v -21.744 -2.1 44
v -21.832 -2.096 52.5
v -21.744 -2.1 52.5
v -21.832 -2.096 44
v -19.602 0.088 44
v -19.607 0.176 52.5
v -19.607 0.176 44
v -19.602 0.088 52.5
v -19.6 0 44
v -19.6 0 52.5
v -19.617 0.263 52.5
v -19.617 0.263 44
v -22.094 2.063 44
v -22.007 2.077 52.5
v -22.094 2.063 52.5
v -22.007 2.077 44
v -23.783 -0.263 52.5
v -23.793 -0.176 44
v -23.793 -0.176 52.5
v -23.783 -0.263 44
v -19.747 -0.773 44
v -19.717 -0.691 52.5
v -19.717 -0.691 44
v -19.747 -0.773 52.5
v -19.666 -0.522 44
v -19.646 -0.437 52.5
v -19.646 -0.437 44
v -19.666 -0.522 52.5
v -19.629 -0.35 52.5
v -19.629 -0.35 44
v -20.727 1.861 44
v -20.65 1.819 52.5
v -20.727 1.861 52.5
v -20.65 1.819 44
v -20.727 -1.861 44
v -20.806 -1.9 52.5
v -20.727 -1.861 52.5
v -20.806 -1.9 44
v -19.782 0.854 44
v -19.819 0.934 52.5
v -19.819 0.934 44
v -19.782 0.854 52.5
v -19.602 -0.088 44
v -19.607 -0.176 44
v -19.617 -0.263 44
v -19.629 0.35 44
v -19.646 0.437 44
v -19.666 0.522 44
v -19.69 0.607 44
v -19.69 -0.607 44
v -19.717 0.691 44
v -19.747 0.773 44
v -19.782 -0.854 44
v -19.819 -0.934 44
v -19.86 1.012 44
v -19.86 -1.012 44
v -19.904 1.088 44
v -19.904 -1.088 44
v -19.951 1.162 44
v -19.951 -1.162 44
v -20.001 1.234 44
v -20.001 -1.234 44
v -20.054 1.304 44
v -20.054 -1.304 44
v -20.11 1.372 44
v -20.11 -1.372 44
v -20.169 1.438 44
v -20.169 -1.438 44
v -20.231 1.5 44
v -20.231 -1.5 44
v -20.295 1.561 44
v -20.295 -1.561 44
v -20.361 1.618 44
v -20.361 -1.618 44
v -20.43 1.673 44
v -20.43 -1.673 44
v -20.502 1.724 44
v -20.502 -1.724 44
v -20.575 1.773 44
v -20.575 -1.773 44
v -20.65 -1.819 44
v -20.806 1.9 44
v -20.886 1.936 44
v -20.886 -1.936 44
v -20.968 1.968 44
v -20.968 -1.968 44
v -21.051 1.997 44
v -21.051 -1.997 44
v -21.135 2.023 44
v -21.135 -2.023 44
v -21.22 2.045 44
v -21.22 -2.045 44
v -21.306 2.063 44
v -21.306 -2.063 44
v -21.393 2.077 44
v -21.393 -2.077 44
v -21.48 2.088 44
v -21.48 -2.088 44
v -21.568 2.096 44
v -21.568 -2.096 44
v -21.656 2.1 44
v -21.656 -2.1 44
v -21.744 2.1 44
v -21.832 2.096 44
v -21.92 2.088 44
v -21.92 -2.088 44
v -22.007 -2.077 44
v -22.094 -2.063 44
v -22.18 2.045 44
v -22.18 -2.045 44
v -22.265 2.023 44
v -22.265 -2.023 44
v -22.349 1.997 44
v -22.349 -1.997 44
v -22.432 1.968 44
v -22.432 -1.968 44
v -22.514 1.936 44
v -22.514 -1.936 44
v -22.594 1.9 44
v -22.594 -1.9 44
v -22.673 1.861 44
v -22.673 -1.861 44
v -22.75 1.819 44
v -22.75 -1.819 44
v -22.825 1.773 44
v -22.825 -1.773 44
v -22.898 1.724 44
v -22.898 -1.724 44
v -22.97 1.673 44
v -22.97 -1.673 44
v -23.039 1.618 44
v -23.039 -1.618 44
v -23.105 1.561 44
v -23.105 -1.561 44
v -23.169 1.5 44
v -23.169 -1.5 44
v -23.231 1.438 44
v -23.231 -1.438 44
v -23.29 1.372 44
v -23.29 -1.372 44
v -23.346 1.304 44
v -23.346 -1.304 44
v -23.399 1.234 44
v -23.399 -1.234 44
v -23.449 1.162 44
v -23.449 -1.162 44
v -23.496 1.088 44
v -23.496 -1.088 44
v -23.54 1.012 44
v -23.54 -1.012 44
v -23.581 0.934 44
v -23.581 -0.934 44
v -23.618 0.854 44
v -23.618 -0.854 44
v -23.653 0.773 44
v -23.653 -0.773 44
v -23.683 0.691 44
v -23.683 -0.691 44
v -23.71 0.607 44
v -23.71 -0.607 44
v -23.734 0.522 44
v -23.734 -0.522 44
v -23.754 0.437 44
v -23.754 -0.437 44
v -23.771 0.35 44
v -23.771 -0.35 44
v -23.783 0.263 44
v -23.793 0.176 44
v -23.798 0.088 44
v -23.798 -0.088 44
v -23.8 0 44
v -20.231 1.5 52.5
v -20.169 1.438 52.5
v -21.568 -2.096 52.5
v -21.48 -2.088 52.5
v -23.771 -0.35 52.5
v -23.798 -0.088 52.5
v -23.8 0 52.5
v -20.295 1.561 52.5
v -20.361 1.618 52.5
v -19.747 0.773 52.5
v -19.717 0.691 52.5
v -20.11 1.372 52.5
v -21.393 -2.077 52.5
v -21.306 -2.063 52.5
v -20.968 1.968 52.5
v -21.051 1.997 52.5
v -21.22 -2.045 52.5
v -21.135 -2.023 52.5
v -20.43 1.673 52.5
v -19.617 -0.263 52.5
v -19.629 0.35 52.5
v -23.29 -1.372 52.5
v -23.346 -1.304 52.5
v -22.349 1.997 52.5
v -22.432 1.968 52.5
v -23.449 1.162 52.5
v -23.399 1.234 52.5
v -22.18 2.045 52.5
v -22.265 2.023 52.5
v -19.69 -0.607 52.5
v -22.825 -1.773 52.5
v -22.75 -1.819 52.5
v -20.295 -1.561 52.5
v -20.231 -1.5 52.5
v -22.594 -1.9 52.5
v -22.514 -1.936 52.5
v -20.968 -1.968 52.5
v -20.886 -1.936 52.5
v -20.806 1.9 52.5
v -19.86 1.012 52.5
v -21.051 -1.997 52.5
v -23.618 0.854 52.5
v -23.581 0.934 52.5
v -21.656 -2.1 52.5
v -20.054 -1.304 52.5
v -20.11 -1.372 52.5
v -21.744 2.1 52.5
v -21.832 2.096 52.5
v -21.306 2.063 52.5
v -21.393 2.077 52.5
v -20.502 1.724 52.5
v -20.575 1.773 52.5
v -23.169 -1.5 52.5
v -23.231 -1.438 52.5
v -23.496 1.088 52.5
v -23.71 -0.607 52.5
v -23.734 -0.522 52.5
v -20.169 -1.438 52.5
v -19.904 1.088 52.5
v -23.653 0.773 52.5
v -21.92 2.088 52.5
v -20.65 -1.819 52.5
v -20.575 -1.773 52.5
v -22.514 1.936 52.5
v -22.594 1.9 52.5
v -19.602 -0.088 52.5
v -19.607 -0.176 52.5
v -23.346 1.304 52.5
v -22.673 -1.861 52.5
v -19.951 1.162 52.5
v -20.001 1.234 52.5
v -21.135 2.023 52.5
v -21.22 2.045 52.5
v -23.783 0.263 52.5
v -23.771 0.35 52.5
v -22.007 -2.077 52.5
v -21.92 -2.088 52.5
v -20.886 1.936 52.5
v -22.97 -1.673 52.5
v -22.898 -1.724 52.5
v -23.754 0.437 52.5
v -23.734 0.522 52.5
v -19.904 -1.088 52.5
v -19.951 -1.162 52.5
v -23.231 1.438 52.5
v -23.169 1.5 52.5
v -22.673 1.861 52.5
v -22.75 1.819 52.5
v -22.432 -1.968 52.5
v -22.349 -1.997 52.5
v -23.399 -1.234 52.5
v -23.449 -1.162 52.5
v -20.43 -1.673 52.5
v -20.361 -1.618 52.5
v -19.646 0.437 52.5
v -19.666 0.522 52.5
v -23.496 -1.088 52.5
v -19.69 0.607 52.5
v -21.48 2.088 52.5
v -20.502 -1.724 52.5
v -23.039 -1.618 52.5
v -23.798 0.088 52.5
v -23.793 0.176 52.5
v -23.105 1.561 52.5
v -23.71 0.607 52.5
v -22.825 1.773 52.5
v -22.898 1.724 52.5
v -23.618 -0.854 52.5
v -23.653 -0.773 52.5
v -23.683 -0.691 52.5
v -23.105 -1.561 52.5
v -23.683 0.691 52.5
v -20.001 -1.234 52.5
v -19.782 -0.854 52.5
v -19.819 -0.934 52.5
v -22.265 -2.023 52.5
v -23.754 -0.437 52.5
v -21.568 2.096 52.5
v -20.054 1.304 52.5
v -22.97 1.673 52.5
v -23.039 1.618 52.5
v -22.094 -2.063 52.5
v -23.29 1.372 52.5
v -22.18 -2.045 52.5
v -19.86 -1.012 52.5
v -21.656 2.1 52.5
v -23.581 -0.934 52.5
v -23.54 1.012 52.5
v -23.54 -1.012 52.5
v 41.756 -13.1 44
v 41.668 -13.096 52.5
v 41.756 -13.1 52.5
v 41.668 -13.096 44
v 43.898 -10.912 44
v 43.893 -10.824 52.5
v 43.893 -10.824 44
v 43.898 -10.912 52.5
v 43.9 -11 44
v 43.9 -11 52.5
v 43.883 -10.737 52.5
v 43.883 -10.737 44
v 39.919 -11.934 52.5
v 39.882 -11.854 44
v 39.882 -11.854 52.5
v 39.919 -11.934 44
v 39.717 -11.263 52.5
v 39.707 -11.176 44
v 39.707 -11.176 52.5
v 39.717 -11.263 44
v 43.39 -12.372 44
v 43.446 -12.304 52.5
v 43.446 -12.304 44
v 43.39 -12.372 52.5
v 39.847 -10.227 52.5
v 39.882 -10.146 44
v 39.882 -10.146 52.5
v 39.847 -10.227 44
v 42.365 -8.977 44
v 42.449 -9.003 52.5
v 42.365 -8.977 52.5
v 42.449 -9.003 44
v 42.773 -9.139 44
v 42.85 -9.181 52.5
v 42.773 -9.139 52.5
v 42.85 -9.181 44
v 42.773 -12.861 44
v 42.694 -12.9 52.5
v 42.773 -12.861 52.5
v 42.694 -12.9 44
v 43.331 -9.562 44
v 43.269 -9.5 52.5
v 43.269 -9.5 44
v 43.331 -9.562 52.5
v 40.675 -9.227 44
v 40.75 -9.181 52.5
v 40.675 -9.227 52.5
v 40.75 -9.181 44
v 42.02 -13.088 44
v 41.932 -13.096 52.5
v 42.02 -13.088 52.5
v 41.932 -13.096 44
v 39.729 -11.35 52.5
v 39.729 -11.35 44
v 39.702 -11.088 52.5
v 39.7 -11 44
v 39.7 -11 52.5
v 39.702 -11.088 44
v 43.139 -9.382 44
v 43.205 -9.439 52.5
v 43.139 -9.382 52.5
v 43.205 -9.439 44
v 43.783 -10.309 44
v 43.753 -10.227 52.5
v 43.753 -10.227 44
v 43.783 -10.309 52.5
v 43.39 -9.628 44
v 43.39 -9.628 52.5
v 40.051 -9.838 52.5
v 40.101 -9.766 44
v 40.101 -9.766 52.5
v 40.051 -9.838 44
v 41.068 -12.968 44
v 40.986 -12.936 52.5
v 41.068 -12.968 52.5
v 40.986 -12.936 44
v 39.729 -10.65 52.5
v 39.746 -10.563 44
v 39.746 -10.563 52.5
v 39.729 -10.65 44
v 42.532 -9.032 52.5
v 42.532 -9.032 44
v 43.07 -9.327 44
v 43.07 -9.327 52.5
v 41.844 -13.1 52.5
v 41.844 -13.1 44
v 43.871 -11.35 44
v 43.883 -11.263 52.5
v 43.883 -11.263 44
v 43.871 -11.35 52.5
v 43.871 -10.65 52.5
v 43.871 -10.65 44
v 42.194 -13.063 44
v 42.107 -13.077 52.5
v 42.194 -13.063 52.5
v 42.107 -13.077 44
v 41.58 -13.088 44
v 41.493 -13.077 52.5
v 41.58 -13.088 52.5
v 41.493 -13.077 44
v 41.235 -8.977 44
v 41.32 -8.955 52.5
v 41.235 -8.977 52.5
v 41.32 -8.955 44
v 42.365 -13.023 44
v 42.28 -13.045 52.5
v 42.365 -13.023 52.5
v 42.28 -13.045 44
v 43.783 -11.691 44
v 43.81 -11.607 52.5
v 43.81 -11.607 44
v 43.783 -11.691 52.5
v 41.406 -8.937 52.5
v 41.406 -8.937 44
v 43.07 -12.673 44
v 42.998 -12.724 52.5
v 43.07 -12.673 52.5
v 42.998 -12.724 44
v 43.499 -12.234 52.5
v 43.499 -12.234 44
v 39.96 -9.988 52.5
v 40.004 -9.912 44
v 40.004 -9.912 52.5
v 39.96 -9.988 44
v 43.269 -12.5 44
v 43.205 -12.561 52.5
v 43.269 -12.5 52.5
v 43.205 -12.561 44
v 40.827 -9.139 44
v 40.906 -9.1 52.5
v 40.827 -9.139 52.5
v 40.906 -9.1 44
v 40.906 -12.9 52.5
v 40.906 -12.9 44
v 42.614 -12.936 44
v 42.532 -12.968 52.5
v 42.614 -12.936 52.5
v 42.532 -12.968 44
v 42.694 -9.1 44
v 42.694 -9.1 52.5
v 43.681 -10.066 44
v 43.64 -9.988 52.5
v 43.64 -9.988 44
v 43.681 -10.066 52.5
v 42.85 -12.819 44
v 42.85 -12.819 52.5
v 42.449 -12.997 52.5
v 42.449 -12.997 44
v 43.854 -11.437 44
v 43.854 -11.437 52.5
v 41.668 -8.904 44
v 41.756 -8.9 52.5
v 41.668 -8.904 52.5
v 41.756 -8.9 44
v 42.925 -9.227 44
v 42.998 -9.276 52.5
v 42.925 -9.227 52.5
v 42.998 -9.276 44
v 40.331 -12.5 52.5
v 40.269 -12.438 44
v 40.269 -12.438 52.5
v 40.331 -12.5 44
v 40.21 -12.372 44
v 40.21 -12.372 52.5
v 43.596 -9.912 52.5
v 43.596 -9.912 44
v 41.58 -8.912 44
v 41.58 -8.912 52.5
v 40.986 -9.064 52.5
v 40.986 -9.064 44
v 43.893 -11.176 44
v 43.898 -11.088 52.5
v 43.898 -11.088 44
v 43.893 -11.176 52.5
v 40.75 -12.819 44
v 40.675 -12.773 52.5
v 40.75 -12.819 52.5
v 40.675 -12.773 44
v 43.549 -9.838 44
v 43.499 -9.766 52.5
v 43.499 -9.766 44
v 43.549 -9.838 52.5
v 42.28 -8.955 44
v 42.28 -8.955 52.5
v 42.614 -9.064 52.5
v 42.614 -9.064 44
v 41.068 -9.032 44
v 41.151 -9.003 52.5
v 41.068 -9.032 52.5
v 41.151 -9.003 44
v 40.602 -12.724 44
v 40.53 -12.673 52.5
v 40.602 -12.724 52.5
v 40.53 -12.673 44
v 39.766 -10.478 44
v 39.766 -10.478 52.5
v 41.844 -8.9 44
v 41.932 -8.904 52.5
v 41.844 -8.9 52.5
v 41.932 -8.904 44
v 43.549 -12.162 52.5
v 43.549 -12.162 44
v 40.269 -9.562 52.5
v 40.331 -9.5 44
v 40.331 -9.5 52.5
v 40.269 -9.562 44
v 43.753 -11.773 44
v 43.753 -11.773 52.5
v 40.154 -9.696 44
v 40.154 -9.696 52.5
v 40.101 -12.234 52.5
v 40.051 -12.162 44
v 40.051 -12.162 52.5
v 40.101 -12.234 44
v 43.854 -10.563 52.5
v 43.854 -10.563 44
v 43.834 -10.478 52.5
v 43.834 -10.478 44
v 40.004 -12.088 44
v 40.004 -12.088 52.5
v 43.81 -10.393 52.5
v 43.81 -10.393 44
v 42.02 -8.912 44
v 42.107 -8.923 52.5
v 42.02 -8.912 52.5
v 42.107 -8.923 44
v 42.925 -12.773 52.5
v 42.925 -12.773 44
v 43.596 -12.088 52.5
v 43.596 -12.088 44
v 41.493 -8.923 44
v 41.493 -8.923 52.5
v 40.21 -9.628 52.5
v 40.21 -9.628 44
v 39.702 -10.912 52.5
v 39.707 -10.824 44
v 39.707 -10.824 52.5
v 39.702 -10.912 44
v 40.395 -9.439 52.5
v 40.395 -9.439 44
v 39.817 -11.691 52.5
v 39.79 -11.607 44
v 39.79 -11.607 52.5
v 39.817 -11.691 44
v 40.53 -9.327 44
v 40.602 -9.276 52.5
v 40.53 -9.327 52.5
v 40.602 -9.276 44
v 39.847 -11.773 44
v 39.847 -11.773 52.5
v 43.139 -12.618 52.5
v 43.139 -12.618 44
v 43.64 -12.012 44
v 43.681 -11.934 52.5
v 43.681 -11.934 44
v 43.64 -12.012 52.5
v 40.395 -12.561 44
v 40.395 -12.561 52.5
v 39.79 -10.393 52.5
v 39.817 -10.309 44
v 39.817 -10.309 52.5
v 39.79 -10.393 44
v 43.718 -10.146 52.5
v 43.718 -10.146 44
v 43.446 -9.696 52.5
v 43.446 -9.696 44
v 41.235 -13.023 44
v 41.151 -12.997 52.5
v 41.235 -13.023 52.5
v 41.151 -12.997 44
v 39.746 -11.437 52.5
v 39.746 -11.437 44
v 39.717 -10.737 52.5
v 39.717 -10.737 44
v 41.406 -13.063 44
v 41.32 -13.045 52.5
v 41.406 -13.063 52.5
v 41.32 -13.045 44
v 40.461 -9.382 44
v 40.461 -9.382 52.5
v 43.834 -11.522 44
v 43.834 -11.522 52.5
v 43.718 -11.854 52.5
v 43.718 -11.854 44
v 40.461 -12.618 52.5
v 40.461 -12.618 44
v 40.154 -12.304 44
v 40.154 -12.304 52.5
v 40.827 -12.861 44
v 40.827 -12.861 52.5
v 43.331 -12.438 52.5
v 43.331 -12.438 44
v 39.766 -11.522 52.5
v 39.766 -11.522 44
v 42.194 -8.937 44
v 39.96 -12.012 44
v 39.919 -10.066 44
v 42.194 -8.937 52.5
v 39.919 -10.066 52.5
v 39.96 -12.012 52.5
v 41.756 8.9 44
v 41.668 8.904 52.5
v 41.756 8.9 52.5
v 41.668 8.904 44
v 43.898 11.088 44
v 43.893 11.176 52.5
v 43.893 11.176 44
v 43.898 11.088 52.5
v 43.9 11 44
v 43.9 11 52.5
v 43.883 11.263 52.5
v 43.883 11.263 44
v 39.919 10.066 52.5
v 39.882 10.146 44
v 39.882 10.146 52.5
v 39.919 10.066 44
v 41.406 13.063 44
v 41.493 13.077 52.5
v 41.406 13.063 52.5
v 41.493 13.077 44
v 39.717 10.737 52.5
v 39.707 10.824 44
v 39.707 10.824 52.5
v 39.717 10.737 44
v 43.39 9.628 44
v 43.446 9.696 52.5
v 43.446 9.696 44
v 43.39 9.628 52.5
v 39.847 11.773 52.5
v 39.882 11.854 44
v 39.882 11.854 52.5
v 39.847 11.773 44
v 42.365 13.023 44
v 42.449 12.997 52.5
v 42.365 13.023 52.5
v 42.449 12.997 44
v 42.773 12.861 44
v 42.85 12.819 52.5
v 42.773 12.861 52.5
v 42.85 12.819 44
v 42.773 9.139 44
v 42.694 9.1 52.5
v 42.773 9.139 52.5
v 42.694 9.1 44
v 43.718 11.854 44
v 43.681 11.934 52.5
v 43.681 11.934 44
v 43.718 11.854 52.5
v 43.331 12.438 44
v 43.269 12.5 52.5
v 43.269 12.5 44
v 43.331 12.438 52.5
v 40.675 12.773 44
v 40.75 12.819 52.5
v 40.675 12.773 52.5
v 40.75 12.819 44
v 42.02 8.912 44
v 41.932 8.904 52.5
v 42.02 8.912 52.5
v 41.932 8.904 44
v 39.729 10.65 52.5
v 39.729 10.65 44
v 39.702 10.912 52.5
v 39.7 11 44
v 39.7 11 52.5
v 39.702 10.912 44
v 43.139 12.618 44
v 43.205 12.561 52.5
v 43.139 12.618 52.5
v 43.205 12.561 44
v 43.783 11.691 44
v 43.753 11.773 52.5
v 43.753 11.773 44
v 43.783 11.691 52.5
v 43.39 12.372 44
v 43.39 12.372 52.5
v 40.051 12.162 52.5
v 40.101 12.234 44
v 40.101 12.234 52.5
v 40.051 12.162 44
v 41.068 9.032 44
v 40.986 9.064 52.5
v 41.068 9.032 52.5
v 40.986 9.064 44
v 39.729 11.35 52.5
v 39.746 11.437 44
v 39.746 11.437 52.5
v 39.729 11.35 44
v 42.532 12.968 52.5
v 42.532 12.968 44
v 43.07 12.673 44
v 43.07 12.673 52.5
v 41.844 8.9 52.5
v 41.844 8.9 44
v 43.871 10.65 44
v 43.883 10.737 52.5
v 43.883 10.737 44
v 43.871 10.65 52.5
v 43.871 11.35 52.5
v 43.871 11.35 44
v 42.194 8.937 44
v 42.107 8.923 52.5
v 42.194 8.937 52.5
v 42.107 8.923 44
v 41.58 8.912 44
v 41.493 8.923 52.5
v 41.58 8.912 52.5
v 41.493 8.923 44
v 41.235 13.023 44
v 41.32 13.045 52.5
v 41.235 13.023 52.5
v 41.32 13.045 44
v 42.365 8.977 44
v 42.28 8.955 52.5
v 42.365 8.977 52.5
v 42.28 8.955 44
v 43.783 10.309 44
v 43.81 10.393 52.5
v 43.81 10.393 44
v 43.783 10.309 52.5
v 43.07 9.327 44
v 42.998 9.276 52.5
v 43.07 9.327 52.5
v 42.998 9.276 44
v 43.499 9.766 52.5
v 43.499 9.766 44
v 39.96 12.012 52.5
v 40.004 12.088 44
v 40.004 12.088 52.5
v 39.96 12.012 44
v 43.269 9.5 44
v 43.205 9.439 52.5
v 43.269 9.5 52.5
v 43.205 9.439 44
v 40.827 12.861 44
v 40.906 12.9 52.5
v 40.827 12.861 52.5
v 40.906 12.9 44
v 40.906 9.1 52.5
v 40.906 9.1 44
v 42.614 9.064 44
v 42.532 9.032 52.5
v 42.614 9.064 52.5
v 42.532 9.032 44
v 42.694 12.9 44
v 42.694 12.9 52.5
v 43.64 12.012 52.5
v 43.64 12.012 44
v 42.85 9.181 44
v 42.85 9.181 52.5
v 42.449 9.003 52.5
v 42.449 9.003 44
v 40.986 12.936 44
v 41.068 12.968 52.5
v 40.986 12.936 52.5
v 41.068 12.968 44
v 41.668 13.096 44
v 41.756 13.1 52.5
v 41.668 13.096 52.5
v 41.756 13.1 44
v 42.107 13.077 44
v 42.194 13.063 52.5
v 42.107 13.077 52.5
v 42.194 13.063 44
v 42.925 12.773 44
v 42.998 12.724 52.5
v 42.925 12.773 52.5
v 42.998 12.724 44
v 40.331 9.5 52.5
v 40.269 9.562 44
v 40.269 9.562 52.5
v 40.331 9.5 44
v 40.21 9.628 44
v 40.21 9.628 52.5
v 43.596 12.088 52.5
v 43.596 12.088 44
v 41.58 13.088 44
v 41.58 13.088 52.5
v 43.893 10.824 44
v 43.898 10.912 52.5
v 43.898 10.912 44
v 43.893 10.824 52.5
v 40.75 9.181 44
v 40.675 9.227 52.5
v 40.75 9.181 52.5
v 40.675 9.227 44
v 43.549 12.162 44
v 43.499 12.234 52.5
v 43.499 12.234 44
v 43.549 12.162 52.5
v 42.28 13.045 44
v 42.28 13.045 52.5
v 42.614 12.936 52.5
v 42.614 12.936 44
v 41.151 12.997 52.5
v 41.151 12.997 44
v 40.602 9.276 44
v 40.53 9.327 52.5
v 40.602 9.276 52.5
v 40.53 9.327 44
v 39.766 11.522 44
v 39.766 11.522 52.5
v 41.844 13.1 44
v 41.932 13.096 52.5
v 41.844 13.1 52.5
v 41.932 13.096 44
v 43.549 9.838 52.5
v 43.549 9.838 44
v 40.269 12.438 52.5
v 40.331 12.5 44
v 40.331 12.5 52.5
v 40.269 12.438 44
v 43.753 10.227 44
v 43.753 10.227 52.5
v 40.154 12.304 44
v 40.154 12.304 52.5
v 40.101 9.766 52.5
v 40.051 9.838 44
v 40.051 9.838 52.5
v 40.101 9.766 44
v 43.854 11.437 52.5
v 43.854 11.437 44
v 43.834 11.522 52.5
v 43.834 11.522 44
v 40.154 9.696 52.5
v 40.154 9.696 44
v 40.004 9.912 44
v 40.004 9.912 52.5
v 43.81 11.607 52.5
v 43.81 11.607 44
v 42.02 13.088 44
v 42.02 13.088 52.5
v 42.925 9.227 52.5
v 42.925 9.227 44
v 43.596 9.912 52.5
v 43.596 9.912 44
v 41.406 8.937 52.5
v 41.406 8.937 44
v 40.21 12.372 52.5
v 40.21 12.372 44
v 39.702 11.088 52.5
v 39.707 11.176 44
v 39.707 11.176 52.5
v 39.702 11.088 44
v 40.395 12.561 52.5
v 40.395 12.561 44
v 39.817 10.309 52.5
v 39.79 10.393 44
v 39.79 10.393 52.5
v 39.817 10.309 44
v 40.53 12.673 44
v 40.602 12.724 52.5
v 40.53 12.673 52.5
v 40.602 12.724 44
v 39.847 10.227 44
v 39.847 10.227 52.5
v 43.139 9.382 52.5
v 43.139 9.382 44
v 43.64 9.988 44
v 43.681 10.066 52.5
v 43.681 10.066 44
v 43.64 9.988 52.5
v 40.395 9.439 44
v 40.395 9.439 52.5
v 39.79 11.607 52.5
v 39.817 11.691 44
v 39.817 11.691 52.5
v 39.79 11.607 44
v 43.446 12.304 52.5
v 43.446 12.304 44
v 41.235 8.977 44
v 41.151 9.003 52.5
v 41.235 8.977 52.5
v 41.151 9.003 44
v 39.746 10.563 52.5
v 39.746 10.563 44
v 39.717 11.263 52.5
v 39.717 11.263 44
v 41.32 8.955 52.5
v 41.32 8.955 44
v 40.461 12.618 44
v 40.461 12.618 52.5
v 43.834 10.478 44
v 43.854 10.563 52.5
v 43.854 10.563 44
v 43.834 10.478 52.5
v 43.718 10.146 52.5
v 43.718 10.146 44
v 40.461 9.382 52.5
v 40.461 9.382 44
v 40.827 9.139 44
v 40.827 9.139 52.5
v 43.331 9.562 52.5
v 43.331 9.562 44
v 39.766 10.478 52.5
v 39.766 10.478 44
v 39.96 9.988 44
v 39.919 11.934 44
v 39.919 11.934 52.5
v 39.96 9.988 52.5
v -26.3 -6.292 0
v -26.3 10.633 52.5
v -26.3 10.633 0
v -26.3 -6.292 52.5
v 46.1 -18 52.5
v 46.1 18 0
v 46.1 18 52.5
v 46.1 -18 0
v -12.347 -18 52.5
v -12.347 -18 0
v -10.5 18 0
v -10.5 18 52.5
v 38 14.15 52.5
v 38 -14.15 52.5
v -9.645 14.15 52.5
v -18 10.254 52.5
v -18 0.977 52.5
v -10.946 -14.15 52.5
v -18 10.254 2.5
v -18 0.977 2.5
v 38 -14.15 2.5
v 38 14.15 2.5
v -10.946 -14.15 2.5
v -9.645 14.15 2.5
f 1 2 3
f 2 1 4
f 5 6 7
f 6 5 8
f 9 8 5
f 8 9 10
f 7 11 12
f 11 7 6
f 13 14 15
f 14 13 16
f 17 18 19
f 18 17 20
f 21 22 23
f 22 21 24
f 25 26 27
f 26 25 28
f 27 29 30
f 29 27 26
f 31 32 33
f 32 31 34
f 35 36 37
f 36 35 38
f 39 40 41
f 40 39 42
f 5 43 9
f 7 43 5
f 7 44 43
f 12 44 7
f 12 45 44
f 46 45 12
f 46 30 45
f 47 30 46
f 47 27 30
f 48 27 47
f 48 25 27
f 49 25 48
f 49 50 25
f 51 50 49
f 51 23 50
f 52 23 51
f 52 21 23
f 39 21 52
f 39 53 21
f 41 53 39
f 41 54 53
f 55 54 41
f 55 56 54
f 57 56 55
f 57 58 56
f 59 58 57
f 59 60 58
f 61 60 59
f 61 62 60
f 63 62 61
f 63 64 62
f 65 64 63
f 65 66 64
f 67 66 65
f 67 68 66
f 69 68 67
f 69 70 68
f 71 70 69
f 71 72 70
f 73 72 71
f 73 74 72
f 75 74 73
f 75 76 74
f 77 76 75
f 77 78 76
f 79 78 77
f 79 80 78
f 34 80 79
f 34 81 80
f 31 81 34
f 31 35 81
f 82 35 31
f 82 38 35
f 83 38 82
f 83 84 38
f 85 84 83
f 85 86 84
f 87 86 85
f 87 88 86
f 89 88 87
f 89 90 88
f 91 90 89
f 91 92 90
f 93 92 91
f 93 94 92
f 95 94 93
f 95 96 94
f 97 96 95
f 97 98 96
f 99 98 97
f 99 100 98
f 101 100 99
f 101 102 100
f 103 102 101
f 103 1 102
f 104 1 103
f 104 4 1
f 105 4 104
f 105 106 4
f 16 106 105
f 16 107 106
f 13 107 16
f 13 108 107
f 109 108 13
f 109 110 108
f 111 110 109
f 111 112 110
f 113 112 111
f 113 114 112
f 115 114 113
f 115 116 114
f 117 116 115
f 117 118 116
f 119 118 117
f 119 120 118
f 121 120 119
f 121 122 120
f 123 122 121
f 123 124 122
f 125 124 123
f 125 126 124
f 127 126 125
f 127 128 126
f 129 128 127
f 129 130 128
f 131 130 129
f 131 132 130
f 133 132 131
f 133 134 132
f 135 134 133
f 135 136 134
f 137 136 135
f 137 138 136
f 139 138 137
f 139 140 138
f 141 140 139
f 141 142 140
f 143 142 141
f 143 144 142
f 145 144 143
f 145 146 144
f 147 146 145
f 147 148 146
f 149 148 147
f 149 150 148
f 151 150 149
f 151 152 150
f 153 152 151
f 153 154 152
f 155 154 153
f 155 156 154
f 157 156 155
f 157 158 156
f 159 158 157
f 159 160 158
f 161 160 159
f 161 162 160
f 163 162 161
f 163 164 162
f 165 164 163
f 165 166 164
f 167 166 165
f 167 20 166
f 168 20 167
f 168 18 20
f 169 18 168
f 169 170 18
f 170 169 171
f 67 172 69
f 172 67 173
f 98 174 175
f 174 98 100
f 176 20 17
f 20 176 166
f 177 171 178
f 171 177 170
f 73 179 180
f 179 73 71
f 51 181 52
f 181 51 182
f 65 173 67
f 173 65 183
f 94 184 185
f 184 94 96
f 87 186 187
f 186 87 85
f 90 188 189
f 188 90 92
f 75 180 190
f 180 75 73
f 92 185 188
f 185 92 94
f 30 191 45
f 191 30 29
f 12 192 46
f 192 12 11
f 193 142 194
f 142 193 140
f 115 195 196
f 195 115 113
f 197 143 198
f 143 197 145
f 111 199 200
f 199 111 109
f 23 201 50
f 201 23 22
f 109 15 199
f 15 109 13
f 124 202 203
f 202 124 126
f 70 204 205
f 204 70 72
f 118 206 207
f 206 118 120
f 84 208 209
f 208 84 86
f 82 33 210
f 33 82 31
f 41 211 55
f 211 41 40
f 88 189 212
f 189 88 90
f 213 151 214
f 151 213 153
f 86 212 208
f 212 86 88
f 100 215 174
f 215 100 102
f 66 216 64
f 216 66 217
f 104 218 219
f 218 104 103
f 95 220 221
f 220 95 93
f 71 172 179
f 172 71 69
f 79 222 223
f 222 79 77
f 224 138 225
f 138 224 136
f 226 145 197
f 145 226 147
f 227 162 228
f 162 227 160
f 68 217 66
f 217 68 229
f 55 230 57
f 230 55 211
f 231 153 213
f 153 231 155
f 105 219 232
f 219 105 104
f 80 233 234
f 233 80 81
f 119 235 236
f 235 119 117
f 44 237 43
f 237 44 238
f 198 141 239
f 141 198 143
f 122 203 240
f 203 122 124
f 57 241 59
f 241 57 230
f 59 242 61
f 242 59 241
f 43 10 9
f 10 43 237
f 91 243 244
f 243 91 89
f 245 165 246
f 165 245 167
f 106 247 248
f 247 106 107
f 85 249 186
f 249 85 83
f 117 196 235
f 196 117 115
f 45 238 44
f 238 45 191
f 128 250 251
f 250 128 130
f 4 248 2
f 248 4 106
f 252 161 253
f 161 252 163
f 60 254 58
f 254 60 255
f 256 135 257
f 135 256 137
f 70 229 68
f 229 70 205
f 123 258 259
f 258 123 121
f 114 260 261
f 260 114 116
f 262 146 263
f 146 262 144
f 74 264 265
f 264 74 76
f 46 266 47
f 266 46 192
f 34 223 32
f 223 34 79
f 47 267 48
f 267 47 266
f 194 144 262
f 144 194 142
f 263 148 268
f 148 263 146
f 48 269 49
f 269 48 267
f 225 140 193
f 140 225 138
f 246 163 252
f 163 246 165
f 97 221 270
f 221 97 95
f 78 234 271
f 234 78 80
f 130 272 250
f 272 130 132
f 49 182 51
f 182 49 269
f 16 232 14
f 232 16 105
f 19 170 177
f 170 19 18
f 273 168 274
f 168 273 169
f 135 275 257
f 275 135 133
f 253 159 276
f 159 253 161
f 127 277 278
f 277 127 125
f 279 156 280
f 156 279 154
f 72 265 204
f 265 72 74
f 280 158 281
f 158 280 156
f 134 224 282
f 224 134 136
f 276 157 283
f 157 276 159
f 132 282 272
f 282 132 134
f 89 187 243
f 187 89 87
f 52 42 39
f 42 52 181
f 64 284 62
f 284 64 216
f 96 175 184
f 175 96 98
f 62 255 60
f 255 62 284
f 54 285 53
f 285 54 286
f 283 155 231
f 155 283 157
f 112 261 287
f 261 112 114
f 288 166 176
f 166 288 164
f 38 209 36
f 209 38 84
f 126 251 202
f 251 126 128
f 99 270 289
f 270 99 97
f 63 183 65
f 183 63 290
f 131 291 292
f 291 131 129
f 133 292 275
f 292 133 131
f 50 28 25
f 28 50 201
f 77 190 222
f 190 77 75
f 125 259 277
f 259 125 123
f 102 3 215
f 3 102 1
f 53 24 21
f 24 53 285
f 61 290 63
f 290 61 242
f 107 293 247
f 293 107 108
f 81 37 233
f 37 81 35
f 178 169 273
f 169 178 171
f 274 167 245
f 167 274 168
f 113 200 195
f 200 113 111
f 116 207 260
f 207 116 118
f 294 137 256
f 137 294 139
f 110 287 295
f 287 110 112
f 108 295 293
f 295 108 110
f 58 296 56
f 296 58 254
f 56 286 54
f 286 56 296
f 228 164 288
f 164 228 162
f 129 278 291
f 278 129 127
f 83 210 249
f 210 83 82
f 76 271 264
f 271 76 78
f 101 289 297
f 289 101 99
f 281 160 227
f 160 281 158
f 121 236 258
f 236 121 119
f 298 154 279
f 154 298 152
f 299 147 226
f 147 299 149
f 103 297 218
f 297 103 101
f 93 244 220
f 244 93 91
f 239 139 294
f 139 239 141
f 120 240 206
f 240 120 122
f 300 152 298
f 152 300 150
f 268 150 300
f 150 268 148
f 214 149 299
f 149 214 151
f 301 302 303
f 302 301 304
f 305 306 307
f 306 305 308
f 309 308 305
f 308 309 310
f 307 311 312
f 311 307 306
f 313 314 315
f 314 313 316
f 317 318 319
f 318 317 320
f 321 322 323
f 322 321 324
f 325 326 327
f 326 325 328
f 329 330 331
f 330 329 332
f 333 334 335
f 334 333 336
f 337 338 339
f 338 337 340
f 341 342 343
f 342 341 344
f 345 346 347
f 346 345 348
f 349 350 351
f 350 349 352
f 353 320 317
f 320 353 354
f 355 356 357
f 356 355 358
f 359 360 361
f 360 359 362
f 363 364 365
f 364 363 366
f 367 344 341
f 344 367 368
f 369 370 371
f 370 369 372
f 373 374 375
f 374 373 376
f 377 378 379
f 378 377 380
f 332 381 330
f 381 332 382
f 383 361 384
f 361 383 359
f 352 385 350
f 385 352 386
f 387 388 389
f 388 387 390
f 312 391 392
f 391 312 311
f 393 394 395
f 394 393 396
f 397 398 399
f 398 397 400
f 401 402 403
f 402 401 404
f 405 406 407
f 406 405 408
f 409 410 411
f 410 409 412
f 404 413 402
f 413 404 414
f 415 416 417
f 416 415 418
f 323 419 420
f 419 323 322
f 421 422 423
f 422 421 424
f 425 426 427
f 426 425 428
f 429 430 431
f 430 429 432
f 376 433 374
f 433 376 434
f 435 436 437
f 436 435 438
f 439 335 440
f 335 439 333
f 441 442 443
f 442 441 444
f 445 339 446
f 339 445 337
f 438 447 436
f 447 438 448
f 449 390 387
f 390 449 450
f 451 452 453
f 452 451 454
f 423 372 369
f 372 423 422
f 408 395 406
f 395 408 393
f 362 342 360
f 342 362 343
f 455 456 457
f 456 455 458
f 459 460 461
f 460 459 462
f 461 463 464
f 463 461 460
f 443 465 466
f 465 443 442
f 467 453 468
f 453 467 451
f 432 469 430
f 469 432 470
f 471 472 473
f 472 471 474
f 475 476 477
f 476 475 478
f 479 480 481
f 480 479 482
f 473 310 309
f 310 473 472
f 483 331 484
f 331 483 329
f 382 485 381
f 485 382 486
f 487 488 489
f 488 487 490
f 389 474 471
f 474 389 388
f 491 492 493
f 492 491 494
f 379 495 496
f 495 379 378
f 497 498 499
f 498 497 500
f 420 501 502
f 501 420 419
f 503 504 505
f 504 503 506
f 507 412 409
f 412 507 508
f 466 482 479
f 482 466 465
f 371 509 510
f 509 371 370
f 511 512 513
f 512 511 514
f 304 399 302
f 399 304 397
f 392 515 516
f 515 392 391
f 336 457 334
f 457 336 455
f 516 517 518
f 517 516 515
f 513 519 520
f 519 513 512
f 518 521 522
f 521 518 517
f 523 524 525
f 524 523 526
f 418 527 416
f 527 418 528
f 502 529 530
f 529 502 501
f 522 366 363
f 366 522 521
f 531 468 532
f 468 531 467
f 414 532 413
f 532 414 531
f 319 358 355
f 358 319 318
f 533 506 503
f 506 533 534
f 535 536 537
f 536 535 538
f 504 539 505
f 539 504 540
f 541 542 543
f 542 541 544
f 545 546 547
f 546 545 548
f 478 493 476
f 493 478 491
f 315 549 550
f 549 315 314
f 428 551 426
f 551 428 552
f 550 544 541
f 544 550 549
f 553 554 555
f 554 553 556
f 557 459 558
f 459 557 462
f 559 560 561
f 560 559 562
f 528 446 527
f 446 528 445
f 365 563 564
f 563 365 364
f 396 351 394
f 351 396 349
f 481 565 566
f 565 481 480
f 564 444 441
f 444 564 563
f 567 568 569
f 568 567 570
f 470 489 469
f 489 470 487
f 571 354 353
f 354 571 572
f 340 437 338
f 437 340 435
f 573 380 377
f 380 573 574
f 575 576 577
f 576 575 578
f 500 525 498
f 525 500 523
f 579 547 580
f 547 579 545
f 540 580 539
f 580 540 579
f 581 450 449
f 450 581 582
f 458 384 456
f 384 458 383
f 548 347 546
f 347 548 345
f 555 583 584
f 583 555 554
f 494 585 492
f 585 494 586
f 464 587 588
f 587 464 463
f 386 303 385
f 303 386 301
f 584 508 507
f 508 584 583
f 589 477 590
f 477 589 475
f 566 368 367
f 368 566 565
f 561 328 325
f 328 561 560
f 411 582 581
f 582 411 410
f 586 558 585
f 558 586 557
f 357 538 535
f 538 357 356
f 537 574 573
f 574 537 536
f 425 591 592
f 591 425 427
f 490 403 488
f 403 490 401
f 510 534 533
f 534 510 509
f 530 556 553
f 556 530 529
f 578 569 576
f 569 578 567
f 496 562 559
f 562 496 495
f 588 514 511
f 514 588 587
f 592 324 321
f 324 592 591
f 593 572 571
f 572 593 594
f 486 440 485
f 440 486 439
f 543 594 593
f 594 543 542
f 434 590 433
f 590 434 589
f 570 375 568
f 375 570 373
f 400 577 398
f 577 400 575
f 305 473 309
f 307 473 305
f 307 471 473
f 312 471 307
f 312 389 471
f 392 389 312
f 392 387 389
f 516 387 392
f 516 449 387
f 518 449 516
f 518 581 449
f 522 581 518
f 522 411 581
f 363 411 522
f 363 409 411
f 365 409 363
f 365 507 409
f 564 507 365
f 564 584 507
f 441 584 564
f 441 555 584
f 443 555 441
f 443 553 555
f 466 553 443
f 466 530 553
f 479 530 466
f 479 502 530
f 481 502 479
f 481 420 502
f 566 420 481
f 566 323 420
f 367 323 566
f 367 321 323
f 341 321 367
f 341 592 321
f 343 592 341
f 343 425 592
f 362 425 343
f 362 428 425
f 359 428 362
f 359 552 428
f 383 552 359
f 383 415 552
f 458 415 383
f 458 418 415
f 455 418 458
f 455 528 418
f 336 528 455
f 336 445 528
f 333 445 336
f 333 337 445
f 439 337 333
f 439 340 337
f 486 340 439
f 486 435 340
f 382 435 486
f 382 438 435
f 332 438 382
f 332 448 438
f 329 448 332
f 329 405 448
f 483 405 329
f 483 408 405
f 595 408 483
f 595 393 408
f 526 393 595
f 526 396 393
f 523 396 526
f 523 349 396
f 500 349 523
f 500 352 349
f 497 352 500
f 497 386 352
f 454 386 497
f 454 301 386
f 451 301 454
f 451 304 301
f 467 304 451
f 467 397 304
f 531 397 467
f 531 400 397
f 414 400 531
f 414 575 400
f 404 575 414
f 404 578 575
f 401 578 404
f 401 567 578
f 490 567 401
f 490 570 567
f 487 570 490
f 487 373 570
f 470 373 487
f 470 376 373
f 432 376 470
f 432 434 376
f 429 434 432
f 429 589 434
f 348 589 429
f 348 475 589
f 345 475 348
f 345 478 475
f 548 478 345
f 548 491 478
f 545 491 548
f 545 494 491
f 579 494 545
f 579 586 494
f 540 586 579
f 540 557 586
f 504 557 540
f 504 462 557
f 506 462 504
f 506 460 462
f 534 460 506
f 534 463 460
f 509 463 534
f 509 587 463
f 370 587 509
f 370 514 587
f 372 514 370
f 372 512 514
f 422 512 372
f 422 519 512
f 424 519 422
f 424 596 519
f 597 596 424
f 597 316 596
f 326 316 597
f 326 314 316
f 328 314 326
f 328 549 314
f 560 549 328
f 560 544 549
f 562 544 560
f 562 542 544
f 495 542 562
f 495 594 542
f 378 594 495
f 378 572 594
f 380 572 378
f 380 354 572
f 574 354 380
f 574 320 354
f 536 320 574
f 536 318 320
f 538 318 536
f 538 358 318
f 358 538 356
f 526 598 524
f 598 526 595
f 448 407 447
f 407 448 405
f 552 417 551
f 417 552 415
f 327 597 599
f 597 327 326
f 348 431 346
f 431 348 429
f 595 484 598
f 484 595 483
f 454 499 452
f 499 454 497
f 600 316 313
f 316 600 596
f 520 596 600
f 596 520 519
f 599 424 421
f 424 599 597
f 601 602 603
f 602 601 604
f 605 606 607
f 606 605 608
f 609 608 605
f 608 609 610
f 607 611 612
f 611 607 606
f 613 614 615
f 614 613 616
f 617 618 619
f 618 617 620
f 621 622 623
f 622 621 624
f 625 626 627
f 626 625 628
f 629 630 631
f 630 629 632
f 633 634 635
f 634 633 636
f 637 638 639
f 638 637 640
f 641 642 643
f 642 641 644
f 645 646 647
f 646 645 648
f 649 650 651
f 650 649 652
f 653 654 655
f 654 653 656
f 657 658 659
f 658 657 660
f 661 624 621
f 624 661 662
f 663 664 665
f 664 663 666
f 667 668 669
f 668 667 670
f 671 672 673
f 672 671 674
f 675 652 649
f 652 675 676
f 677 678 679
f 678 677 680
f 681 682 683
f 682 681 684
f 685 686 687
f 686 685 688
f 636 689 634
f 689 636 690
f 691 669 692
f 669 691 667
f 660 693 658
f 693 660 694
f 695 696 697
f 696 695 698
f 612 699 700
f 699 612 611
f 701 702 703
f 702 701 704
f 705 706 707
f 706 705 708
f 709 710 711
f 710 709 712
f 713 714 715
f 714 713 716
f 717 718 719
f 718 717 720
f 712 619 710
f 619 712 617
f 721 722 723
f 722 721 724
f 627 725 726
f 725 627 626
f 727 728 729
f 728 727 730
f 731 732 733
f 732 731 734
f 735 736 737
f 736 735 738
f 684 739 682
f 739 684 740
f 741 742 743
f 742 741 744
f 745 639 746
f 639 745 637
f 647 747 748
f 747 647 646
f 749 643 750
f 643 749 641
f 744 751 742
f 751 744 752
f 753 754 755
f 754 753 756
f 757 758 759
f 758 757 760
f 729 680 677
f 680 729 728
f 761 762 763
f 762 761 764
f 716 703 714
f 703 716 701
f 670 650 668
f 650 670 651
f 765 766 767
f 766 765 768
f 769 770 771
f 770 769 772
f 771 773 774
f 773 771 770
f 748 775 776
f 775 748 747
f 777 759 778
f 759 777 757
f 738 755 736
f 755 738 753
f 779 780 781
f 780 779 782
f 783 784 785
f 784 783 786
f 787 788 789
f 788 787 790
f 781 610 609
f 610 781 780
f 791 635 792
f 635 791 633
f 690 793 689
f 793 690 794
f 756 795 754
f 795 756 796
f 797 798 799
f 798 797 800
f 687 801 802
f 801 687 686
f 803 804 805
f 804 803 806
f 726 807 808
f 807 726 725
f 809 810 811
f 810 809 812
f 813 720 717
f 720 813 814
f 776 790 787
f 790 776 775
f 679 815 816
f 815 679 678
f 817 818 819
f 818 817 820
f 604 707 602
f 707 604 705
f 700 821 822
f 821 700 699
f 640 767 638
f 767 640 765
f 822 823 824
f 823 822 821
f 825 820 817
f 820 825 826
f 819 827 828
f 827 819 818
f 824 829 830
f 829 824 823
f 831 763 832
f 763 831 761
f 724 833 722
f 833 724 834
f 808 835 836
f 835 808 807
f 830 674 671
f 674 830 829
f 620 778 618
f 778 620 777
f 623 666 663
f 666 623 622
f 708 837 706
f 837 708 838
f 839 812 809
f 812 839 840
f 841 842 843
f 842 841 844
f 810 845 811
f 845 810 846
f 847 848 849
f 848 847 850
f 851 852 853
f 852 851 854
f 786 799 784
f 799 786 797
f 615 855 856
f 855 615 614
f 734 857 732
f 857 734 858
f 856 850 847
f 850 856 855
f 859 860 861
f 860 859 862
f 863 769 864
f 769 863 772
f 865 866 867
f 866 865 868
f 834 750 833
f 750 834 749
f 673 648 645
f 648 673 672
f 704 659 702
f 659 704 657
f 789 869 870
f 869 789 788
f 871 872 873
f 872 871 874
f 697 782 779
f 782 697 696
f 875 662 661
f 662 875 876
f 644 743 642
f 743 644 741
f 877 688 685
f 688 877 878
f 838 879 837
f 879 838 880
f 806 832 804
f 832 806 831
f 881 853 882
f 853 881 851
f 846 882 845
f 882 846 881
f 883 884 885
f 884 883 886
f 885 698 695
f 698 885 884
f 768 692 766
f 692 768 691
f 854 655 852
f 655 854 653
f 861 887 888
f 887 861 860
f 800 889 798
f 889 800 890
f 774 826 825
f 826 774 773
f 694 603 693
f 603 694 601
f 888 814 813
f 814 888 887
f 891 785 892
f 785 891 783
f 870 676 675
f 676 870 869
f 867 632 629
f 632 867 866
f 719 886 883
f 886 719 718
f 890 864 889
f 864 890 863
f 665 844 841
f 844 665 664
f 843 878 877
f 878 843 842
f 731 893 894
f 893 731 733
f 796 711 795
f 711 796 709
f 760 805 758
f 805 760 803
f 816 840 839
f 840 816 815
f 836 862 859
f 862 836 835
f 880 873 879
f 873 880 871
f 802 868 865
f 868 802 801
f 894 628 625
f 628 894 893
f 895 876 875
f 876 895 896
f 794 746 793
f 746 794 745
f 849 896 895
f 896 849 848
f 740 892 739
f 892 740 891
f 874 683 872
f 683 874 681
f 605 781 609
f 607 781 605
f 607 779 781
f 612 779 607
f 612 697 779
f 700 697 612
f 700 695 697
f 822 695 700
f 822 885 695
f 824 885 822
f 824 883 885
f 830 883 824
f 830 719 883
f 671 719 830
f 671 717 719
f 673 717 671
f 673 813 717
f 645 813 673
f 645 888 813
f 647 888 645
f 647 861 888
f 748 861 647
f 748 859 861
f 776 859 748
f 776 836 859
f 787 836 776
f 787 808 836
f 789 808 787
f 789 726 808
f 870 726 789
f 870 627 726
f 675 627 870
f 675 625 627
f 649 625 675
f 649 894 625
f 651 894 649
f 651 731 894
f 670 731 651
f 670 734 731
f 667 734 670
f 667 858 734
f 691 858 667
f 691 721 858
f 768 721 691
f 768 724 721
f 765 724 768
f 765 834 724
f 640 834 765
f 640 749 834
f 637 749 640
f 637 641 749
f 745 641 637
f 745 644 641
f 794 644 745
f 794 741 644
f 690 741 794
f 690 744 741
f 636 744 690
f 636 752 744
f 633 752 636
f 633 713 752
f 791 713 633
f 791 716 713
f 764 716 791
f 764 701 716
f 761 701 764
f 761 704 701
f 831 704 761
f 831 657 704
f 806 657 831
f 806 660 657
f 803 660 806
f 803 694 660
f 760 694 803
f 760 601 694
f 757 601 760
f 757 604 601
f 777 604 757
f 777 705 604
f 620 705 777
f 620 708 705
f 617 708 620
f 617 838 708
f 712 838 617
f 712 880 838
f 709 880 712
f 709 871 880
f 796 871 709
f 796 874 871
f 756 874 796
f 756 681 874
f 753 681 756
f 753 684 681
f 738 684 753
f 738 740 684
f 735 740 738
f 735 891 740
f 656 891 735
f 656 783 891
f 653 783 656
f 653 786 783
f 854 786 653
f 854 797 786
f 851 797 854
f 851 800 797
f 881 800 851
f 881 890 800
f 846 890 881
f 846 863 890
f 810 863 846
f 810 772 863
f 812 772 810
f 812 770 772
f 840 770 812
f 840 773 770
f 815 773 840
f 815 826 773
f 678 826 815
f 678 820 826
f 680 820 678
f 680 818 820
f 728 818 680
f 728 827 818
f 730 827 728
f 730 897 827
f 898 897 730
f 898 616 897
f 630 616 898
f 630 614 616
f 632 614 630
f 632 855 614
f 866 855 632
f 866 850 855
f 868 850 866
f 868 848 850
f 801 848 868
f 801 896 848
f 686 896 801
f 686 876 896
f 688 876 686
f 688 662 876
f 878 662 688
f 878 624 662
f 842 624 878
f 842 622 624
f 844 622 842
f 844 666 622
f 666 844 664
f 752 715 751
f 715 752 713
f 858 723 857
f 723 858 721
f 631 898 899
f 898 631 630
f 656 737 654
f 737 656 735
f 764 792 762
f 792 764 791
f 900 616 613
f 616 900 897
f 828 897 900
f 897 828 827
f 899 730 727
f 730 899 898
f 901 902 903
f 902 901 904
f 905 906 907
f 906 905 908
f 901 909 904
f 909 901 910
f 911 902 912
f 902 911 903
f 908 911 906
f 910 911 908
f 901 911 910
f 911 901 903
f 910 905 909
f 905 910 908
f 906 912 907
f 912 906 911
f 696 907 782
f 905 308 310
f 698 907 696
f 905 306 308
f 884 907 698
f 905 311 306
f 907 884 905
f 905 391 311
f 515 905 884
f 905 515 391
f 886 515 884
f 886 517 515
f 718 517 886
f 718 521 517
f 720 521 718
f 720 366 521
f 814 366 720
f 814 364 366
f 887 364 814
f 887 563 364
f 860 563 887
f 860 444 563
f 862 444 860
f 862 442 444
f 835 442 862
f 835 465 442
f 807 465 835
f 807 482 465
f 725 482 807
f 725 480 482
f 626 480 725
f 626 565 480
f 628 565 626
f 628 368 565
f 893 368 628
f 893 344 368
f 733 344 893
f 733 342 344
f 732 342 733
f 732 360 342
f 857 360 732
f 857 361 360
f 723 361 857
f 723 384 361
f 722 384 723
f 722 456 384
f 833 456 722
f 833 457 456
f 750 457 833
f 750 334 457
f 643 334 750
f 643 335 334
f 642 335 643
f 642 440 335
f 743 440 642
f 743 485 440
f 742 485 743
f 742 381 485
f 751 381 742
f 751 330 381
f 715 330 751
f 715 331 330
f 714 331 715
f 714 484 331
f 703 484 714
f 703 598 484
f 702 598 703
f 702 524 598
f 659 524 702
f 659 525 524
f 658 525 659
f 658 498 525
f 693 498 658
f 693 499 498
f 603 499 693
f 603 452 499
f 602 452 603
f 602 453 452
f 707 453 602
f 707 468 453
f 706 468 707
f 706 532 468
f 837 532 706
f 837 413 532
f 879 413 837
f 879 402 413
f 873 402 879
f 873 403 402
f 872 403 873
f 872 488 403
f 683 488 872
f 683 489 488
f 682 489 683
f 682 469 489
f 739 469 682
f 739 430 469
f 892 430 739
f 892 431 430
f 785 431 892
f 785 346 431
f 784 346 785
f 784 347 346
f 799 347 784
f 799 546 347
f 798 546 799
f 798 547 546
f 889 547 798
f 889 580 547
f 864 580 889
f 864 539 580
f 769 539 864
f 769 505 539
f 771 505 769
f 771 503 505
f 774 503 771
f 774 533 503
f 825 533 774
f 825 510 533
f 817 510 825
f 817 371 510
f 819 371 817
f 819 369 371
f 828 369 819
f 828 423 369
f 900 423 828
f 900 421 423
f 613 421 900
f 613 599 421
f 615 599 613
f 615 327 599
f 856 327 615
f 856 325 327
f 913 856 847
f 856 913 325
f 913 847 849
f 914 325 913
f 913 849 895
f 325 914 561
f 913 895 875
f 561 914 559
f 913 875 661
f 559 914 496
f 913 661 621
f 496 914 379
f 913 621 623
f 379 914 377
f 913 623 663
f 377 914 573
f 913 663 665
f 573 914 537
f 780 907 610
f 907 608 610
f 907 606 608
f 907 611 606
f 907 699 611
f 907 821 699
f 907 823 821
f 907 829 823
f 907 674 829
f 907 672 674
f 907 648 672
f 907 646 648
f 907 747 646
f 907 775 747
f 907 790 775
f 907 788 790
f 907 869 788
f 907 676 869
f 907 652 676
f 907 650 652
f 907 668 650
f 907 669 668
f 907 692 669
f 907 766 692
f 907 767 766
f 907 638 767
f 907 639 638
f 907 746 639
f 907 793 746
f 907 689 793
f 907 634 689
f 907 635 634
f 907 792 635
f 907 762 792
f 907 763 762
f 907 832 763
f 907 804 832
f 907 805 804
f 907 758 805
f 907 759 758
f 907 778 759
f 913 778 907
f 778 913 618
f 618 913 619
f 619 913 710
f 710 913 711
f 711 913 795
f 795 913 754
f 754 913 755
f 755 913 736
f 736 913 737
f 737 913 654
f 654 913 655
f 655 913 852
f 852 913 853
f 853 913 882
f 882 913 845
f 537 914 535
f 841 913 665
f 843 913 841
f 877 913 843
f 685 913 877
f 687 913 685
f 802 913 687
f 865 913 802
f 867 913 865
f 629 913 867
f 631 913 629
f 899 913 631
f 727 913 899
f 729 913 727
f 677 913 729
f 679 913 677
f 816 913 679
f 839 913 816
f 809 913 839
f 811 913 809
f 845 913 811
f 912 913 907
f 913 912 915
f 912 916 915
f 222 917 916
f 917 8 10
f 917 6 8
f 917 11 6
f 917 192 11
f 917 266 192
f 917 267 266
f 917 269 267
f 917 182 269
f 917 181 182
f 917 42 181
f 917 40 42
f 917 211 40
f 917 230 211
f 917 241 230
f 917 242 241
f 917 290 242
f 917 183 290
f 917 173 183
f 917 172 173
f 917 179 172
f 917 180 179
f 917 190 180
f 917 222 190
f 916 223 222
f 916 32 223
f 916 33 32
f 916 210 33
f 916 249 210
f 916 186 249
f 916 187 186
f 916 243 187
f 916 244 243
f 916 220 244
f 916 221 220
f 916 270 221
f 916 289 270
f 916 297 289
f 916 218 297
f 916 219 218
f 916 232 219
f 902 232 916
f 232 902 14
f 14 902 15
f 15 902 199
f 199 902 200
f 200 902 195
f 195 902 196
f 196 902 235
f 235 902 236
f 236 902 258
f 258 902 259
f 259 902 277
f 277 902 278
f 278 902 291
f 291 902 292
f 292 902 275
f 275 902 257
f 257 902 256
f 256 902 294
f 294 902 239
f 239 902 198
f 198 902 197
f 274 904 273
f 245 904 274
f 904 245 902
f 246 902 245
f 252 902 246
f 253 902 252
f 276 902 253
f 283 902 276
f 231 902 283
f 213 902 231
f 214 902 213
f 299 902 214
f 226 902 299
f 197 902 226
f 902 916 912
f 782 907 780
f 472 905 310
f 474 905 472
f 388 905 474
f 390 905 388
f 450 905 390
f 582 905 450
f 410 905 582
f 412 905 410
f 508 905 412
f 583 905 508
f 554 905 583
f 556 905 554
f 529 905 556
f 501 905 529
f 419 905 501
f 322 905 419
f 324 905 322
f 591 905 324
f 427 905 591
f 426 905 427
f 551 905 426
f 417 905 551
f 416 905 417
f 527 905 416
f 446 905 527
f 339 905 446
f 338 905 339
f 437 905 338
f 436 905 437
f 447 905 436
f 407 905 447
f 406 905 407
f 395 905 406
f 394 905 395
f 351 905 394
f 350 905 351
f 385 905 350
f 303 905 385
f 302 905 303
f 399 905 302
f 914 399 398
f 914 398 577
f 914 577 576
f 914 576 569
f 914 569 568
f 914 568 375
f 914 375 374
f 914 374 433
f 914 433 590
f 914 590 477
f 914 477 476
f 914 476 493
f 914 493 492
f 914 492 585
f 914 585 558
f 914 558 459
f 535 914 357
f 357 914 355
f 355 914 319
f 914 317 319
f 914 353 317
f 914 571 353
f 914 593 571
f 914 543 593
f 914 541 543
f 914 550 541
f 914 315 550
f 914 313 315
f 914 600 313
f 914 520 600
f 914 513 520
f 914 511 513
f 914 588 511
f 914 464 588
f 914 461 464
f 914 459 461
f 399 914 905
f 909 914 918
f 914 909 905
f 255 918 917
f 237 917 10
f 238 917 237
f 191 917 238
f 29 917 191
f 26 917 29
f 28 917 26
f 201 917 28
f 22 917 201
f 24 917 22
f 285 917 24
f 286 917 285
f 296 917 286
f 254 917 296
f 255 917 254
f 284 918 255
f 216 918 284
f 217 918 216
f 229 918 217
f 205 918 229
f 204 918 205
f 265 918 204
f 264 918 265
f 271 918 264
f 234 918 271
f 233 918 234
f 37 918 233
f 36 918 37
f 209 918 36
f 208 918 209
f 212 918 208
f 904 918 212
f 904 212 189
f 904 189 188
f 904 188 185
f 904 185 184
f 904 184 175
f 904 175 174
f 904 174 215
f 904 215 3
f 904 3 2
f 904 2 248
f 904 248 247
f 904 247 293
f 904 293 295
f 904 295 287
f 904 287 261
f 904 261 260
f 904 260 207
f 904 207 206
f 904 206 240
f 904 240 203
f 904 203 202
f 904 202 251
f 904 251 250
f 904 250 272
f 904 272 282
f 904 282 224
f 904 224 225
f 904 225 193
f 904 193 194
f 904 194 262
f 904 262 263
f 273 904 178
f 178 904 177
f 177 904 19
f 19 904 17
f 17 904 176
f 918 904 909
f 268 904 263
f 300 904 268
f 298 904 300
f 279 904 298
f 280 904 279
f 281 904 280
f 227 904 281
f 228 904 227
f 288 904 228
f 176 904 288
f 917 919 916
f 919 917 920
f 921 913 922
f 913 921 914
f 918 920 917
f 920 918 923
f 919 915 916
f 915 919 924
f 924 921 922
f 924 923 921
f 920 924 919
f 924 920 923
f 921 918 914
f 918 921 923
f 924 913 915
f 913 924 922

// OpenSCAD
// =====================================================================
// Projet TinyStar'Ex (TSE) / TinyStar'Ex (TSE) project
// Spectrographe / Spectrograph
// Sources OpenSCAD des fichiers STL / OpenSCAD sources of the STL files
// Auteur / Author : Christian Buil - STAROS Projects
// Version 1.2 - Nov. 4, 2026
// =====================================================================


$fn=150;  // Finesse des cercles / Circle resolution
epsilon = 0.01;     // Petite marge pour des soustractions propres
                    // Small margin for clean subtractions
                    
// =====================================================================
// FOURCHE DE RÉGLAGE / ADJUSTMENT FORK
// Pièce / Part : 1A-fourche-reglage
// =====================================================================

module fourche_reglage()
{
    difference()
    {
        translate([0, -16, 0])
            cube([41, 32, 18]);
        translate([12, -16 - epsilon, 5])
            cube([29 + epsilon, 32 + 2 * epsilon, 13 + epsilon]);
        translate([-epsilon, -4, -epsilon])
            cube([12 + 2 * epsilon, 8, 18 + 2 * epsilon]);
        translate([6, -16 - epsilon, 12])
            rotate([-90, 0, 0])
                cylinder(h = 32 + 2 * epsilon, d = 5.9);
        for (x = [17, 35])
            translate([x, 0, -epsilon])
                cylinder(h = 5 + 2 * epsilon, d = 4.4);
    }
}


// =====================================================================
// MANETTE DE RÉGLAGE / ADJUSTMENT LEVER
// Pièce / Part : 2A-manette-reglage
// =====================================================================

module manette_reglage()
{
    difference()
    {
        union()
        {       
            cylinder(h = 12, d = 46.8);
            translate([-50, -2.5, 0])
                cube([29, 5, 12]);
            translate([0, -9.5, 0])
                cube([36, 19, 12]);
        }

        // Alésage Ø40.05 du tube collimateur
        // Ø40.05 bore for the collimator tube
        translate([0, 0, -epsilon])
            cylinder(h = 12 + 2 * epsilon, d = 40.05);

        // Fente de serrage de 2.5 mm, de X = 0 à 38
        // 2.5 mm clamping slot, from X = 0 to 38
        translate([0, -1.25, -epsilon])
            cube([38, 2.5, 12 + 2 * epsilon]);

        // Trou Ø4.3 traversant pour la vis M4
        // Ø4.3 through hole for the M4 screw
        translate([29, -9.5 - epsilon, 6])
            rotate([-90, 0, 0])
                cylinder(h = 19 + 2 * epsilon, d = 4.3);

        // Logement Ø5.7 de l'insert M4
        // Ø5.7 M4 insert hole
        translate([29, -9.5 - epsilon, 6])
            rotate([-90, 0, 0])
                cylinder(h = 6 + epsilon, d = 5.7);
    }
}


// =====================================================================
// BOÎTE DE PROTECTION DE L'INTERFACE RÉSEAU
// GRATING INTERFACE PROTECTION BOX 
// Pièce / Part : 3A-boite-reseau-interface
// =====================================================================

// hauteur : hauteur totale de la boîte, plancher compris (mm)
//           46.0 pour un réseau de 12.5 mm de côté
//           52.5   pour un réseau de 25.0 mm de côté
// hauteur : total box height, floor included (mm)
//           46.0 for a 12.5 mm square grating
//           52.5   for a 25.0 mm square grating
module boite_reseau_interface(hauteur = 52.5)
{
    e = 0.01;   // petit débord pour des soustractions propres
                // small overlap for clean subtractions
    
    difference()
    {
        linear_extrude(height = hauteur)
            polygon([[-10.5,   18], [46.1,  18], [46.1, -18],
                     [-12.347, -18], [-26.3, -6.292], [-26.3, 10.633]]);
        translate([0, 0, 2.5])
            linear_extrude(height = hauteur - 2.5 + e)
                polygon([[ -9.645,  14.15], [38,  14.15], [38, -14.15],
                         [-10.946, -14.15], [-18, 0.977], [-18, 10.254]]);
        for (p = [[-21.7, 0], [41.8, -11], [41.8, 11]])
            translate([p[0], p[1], hauteur - 8.5])
                cylinder(h = 8.5 + e, d = 4.2);
    }
}

// =====================================================================
// BOÎTE RÉSEAU SIMPLE / SIMPLE GRATING BOX
// Pièce / Part : 4A-boite-reseau-simple
// =====================================================================
// Boîte pour réseau de 12.5 mm ou de 25.0 mm de côté, fermée par le
// couvercle (pièce 5A-boite-reseau-couvercle).
// Box for a 12.5 mm or 25.0 mm square grating, closed by the lid
// (part 5A-boite-reseau-couvercle).
// =====================================================================

// hauteur : hauteur totale de la boîte, plancher compris (mm)
//           38.0   pour un réseau de 12.5 mm de côté
//           44.5   pour un réseau de 25.0 mm de côté
// hauteur : total box height, floor included (mm)
//           38.0   for a 12.5 mm square grating
//           44.5   for a 25.0 mm square grating
module boite_reseau_simple(hauteur = 38.0)
{
    e = 0.01;   // petit débord pour des soustractions propres
                // small overlap for clean subtractions

    // Centres des 4 colonnettes de fixation du couvercle
    // Centres of the 4 lid fastening pillars
    colonnettes = [[28.9, 13.8], [-28.9, 13.8], [28.9, -13.8], [-28.9, -13.8]];

    difference()
    {
        union()
        {
            difference()
            {
                translate([-32.5, -19, 0])
                    cube([65, 38, hauteur]);
                translate([-29.5, -16, 3])
                    cube([59, 32, hauteur - 3 + e]);
            }
            for (p = colonnettes)
                translate([p[0], p[1], 0])
                    cylinder(h = hauteur, d = 7.2);
        }

        translate([19, 0, -e])
            cylinder(h = 3 + 2 * e, d = 4.7);

        for (p = colonnettes)
            translate([p[0], p[1], hauteur - 9])
                cylinder(h = 9 + e, d = 4.2);
    }
}

// =====================================================================
// COUVERCLE DE LA BOÎTE RÉSEAU / GRATING BOX LID
// Pièce / Part : 5A-boite-reseau-couvercle
// =====================================================================

module boite_reseau_couvercle()
{
    e = 0.01;   // petit débord pour des soustractions propres
                // small overlap for clean subtractions

    difference()
    {
        translate([-32.5, -19, 0])
            cube([65, 38, 3]);
        for (p = [[28.9, 13.8], [-28.9, 13.8], [28.9, -13.8], [-28.9, -13.8]])
            translate([p[0], p[1], -e])
                cylinder(h = 3 + 2 * e, d = 4.4);
    }
}

// =====================================================================
// AFFICHAGE / DISPLAY
// =====================================================================
// fourche_reglage();
// manette_reglage();
boite_reseau_interface();
// boite_reseau_simple();
// boite_reseau_couvercle();
